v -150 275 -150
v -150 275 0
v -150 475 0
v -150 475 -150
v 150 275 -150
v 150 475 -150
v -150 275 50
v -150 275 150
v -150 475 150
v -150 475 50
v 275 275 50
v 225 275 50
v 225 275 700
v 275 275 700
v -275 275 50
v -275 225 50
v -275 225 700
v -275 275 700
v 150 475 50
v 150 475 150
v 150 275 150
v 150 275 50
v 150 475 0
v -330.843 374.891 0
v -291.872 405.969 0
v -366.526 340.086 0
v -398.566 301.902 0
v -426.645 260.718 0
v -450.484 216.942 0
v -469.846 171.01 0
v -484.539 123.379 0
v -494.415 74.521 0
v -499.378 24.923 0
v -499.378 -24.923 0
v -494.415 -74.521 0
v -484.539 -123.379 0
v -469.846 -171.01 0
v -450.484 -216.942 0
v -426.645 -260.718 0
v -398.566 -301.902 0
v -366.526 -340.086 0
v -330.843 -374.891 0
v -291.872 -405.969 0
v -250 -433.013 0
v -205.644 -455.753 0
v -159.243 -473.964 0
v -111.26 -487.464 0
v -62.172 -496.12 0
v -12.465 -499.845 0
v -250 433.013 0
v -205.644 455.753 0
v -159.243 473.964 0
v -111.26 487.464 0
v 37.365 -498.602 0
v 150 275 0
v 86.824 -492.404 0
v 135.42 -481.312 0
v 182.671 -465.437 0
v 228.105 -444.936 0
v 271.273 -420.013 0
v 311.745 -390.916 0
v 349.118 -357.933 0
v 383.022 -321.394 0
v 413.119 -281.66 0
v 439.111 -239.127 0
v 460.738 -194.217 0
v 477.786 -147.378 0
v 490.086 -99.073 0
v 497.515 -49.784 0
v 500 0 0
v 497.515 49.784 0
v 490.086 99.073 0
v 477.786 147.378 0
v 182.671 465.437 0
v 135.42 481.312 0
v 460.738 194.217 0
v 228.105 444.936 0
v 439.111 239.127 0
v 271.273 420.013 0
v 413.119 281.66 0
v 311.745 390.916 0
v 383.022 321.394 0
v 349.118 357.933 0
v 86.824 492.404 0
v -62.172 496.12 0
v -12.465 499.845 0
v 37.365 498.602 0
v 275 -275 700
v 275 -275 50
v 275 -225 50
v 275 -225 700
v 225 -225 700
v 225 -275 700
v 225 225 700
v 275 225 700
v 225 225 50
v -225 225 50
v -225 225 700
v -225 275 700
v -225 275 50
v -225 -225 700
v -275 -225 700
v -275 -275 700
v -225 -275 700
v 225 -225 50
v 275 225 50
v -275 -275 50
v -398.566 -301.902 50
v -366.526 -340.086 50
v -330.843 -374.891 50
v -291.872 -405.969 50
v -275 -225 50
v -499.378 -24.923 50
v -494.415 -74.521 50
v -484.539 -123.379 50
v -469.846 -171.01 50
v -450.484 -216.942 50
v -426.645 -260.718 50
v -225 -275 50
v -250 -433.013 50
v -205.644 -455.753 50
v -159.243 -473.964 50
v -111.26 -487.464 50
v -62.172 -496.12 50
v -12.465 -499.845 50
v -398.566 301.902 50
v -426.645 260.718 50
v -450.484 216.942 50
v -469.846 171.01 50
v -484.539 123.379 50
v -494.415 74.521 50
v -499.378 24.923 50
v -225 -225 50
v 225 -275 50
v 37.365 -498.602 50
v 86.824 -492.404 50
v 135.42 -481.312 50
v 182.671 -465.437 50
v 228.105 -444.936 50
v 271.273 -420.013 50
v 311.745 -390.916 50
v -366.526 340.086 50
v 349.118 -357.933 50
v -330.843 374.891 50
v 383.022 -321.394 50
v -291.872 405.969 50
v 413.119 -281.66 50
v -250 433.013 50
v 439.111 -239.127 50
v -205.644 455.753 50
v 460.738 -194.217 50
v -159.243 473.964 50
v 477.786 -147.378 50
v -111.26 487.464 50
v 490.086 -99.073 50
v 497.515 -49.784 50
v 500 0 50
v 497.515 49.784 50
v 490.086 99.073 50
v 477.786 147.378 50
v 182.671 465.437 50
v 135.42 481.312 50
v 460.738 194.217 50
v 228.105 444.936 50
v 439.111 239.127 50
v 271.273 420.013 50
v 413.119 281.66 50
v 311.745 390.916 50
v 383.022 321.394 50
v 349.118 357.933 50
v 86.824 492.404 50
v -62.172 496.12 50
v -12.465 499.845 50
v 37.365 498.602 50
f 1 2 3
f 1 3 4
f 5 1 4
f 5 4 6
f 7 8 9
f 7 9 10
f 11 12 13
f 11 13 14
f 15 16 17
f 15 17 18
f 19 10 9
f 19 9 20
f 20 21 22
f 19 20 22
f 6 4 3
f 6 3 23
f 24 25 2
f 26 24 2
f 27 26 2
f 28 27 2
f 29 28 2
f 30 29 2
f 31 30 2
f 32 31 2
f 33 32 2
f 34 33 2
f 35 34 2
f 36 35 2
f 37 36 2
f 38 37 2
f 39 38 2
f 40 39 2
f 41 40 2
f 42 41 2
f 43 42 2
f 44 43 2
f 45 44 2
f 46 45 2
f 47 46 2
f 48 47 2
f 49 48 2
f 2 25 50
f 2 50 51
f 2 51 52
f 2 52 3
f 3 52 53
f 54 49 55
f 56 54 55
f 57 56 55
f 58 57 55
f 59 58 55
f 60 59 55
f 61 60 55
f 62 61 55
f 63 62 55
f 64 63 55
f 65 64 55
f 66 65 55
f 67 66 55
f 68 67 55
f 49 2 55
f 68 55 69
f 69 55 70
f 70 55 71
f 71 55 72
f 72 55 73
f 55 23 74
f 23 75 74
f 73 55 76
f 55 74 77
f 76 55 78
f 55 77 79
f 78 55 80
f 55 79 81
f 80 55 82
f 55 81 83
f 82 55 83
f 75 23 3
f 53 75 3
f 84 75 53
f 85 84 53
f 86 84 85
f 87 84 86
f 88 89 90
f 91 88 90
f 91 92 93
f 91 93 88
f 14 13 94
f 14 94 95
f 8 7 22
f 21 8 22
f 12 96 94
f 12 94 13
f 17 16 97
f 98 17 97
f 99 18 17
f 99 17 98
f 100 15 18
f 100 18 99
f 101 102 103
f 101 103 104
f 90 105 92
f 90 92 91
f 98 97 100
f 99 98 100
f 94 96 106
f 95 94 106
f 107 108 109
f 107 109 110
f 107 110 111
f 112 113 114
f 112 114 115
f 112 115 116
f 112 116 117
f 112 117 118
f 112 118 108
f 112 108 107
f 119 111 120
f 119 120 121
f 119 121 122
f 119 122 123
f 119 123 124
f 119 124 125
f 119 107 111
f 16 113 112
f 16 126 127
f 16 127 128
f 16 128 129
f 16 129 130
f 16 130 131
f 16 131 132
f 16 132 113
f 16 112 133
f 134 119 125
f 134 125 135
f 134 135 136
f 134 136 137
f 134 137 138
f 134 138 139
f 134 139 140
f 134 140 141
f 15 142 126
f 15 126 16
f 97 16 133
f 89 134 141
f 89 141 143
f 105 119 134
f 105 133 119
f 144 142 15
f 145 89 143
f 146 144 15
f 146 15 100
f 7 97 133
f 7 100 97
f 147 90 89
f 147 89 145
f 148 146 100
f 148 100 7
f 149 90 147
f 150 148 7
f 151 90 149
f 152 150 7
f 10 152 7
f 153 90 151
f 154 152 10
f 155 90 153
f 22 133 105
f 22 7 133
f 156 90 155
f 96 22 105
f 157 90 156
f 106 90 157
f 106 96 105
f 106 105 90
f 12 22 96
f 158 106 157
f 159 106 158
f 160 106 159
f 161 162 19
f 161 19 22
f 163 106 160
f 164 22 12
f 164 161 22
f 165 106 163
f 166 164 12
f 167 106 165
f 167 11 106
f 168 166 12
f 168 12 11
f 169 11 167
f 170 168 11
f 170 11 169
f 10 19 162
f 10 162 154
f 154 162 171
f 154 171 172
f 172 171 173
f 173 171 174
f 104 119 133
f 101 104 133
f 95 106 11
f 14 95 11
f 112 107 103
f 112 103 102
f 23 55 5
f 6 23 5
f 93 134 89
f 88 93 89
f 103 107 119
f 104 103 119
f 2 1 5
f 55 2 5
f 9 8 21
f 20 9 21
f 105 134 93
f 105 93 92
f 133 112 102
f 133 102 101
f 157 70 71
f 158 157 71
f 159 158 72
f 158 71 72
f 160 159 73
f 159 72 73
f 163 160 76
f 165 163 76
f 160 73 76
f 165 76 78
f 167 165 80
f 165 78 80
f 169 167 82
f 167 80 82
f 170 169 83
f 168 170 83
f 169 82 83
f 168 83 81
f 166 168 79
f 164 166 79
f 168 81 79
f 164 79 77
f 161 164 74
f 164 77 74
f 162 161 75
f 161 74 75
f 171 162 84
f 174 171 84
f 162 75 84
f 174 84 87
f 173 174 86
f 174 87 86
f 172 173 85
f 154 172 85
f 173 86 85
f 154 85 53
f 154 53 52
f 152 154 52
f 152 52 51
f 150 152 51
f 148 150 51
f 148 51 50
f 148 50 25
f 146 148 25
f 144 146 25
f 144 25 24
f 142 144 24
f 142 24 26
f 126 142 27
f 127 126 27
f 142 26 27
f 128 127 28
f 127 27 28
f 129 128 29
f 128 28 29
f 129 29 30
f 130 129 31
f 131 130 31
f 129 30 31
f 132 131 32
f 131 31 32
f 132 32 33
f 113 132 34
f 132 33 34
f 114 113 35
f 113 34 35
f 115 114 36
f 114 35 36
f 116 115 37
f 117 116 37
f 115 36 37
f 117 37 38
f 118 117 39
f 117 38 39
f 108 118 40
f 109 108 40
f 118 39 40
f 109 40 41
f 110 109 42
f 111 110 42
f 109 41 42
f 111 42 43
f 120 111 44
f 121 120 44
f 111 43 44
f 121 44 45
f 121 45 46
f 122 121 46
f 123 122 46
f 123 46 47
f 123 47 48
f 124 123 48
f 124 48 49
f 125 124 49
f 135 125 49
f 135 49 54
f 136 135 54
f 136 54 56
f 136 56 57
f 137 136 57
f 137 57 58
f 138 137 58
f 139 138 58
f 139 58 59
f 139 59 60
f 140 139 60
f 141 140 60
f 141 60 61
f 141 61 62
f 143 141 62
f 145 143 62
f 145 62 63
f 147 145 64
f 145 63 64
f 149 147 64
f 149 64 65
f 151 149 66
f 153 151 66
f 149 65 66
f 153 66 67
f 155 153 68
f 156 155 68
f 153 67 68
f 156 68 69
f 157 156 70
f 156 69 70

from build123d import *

# Parameters (mm, degrees)
SKETCH_1_R      = 500
EXTRUDE_1_DEPTH = 50
SKETCH_2_W      = 50
SKETCH_2_H      = 50
EXTRUDE_2_DEPTH = 700
SKETCH_3_W      = 50
SKETCH_3_H      = 50
EXTRUDE_3_DEPTH = 700
SKETCH_4_W      = 50
SKETCH_4_H      = 50
EXTRUDE_4_DEPTH = 700
SKETCH_5_W      = 50
SKETCH_5_H      = 50
EXTRUDE_5_DEPTH = 700
SKETCH_6_W      = 300
SKETCH_6_H      = 300
EXTRUDE_6_DEPTH = 200


with BuildPart() as part:
    # 草图1 → 凸台-拉伸1 (new body)
    with BuildSketch(Plane.XY):
        Circle(SKETCH_1_R)
    extrude(amount=EXTRUDE_1_DEPTH)

    # 草图2 → 凸台-拉伸2 (add)
    with BuildSketch(Plane.XY):
        with Locations((250, 250)):
            Rectangle(SKETCH_2_W, SKETCH_2_H)
    extrude(amount=EXTRUDE_2_DEPTH)

    # 草图3 → 凸台-拉伸3 (add)
    with BuildSketch(Plane.XY):
        with Locations((-250, 250)):
            Rectangle(SKETCH_3_W, SKETCH_3_H)
    extrude(amount=EXTRUDE_3_DEPTH)

    # 草图4 → 凸台-拉伸4 (add)
    with BuildSketch(Plane.XY):
        with Locations((250, -250)):
            Rectangle(SKETCH_4_W, SKETCH_4_H)
    extrude(amount=EXTRUDE_4_DEPTH)

    # 草图5 → 凸台-拉伸5 (add)
    with BuildSketch(Plane.XY):
        with Locations((-250, -250)):
            Rectangle(SKETCH_5_W, SKETCH_5_H)
    extrude(amount=EXTRUDE_5_DEPTH)

    # 草图6 → 凸台-拉伸6 (add)
    with BuildSketch(Plane(origin=(0, 275, 0), x_dir=(1, 0, 0), z_dir=(0, 1, 0))):
        Rectangle(SKETCH_6_W, SKETCH_6_H)
    extrude(amount=EXTRUDE_6_DEPTH)


solid = part.part
